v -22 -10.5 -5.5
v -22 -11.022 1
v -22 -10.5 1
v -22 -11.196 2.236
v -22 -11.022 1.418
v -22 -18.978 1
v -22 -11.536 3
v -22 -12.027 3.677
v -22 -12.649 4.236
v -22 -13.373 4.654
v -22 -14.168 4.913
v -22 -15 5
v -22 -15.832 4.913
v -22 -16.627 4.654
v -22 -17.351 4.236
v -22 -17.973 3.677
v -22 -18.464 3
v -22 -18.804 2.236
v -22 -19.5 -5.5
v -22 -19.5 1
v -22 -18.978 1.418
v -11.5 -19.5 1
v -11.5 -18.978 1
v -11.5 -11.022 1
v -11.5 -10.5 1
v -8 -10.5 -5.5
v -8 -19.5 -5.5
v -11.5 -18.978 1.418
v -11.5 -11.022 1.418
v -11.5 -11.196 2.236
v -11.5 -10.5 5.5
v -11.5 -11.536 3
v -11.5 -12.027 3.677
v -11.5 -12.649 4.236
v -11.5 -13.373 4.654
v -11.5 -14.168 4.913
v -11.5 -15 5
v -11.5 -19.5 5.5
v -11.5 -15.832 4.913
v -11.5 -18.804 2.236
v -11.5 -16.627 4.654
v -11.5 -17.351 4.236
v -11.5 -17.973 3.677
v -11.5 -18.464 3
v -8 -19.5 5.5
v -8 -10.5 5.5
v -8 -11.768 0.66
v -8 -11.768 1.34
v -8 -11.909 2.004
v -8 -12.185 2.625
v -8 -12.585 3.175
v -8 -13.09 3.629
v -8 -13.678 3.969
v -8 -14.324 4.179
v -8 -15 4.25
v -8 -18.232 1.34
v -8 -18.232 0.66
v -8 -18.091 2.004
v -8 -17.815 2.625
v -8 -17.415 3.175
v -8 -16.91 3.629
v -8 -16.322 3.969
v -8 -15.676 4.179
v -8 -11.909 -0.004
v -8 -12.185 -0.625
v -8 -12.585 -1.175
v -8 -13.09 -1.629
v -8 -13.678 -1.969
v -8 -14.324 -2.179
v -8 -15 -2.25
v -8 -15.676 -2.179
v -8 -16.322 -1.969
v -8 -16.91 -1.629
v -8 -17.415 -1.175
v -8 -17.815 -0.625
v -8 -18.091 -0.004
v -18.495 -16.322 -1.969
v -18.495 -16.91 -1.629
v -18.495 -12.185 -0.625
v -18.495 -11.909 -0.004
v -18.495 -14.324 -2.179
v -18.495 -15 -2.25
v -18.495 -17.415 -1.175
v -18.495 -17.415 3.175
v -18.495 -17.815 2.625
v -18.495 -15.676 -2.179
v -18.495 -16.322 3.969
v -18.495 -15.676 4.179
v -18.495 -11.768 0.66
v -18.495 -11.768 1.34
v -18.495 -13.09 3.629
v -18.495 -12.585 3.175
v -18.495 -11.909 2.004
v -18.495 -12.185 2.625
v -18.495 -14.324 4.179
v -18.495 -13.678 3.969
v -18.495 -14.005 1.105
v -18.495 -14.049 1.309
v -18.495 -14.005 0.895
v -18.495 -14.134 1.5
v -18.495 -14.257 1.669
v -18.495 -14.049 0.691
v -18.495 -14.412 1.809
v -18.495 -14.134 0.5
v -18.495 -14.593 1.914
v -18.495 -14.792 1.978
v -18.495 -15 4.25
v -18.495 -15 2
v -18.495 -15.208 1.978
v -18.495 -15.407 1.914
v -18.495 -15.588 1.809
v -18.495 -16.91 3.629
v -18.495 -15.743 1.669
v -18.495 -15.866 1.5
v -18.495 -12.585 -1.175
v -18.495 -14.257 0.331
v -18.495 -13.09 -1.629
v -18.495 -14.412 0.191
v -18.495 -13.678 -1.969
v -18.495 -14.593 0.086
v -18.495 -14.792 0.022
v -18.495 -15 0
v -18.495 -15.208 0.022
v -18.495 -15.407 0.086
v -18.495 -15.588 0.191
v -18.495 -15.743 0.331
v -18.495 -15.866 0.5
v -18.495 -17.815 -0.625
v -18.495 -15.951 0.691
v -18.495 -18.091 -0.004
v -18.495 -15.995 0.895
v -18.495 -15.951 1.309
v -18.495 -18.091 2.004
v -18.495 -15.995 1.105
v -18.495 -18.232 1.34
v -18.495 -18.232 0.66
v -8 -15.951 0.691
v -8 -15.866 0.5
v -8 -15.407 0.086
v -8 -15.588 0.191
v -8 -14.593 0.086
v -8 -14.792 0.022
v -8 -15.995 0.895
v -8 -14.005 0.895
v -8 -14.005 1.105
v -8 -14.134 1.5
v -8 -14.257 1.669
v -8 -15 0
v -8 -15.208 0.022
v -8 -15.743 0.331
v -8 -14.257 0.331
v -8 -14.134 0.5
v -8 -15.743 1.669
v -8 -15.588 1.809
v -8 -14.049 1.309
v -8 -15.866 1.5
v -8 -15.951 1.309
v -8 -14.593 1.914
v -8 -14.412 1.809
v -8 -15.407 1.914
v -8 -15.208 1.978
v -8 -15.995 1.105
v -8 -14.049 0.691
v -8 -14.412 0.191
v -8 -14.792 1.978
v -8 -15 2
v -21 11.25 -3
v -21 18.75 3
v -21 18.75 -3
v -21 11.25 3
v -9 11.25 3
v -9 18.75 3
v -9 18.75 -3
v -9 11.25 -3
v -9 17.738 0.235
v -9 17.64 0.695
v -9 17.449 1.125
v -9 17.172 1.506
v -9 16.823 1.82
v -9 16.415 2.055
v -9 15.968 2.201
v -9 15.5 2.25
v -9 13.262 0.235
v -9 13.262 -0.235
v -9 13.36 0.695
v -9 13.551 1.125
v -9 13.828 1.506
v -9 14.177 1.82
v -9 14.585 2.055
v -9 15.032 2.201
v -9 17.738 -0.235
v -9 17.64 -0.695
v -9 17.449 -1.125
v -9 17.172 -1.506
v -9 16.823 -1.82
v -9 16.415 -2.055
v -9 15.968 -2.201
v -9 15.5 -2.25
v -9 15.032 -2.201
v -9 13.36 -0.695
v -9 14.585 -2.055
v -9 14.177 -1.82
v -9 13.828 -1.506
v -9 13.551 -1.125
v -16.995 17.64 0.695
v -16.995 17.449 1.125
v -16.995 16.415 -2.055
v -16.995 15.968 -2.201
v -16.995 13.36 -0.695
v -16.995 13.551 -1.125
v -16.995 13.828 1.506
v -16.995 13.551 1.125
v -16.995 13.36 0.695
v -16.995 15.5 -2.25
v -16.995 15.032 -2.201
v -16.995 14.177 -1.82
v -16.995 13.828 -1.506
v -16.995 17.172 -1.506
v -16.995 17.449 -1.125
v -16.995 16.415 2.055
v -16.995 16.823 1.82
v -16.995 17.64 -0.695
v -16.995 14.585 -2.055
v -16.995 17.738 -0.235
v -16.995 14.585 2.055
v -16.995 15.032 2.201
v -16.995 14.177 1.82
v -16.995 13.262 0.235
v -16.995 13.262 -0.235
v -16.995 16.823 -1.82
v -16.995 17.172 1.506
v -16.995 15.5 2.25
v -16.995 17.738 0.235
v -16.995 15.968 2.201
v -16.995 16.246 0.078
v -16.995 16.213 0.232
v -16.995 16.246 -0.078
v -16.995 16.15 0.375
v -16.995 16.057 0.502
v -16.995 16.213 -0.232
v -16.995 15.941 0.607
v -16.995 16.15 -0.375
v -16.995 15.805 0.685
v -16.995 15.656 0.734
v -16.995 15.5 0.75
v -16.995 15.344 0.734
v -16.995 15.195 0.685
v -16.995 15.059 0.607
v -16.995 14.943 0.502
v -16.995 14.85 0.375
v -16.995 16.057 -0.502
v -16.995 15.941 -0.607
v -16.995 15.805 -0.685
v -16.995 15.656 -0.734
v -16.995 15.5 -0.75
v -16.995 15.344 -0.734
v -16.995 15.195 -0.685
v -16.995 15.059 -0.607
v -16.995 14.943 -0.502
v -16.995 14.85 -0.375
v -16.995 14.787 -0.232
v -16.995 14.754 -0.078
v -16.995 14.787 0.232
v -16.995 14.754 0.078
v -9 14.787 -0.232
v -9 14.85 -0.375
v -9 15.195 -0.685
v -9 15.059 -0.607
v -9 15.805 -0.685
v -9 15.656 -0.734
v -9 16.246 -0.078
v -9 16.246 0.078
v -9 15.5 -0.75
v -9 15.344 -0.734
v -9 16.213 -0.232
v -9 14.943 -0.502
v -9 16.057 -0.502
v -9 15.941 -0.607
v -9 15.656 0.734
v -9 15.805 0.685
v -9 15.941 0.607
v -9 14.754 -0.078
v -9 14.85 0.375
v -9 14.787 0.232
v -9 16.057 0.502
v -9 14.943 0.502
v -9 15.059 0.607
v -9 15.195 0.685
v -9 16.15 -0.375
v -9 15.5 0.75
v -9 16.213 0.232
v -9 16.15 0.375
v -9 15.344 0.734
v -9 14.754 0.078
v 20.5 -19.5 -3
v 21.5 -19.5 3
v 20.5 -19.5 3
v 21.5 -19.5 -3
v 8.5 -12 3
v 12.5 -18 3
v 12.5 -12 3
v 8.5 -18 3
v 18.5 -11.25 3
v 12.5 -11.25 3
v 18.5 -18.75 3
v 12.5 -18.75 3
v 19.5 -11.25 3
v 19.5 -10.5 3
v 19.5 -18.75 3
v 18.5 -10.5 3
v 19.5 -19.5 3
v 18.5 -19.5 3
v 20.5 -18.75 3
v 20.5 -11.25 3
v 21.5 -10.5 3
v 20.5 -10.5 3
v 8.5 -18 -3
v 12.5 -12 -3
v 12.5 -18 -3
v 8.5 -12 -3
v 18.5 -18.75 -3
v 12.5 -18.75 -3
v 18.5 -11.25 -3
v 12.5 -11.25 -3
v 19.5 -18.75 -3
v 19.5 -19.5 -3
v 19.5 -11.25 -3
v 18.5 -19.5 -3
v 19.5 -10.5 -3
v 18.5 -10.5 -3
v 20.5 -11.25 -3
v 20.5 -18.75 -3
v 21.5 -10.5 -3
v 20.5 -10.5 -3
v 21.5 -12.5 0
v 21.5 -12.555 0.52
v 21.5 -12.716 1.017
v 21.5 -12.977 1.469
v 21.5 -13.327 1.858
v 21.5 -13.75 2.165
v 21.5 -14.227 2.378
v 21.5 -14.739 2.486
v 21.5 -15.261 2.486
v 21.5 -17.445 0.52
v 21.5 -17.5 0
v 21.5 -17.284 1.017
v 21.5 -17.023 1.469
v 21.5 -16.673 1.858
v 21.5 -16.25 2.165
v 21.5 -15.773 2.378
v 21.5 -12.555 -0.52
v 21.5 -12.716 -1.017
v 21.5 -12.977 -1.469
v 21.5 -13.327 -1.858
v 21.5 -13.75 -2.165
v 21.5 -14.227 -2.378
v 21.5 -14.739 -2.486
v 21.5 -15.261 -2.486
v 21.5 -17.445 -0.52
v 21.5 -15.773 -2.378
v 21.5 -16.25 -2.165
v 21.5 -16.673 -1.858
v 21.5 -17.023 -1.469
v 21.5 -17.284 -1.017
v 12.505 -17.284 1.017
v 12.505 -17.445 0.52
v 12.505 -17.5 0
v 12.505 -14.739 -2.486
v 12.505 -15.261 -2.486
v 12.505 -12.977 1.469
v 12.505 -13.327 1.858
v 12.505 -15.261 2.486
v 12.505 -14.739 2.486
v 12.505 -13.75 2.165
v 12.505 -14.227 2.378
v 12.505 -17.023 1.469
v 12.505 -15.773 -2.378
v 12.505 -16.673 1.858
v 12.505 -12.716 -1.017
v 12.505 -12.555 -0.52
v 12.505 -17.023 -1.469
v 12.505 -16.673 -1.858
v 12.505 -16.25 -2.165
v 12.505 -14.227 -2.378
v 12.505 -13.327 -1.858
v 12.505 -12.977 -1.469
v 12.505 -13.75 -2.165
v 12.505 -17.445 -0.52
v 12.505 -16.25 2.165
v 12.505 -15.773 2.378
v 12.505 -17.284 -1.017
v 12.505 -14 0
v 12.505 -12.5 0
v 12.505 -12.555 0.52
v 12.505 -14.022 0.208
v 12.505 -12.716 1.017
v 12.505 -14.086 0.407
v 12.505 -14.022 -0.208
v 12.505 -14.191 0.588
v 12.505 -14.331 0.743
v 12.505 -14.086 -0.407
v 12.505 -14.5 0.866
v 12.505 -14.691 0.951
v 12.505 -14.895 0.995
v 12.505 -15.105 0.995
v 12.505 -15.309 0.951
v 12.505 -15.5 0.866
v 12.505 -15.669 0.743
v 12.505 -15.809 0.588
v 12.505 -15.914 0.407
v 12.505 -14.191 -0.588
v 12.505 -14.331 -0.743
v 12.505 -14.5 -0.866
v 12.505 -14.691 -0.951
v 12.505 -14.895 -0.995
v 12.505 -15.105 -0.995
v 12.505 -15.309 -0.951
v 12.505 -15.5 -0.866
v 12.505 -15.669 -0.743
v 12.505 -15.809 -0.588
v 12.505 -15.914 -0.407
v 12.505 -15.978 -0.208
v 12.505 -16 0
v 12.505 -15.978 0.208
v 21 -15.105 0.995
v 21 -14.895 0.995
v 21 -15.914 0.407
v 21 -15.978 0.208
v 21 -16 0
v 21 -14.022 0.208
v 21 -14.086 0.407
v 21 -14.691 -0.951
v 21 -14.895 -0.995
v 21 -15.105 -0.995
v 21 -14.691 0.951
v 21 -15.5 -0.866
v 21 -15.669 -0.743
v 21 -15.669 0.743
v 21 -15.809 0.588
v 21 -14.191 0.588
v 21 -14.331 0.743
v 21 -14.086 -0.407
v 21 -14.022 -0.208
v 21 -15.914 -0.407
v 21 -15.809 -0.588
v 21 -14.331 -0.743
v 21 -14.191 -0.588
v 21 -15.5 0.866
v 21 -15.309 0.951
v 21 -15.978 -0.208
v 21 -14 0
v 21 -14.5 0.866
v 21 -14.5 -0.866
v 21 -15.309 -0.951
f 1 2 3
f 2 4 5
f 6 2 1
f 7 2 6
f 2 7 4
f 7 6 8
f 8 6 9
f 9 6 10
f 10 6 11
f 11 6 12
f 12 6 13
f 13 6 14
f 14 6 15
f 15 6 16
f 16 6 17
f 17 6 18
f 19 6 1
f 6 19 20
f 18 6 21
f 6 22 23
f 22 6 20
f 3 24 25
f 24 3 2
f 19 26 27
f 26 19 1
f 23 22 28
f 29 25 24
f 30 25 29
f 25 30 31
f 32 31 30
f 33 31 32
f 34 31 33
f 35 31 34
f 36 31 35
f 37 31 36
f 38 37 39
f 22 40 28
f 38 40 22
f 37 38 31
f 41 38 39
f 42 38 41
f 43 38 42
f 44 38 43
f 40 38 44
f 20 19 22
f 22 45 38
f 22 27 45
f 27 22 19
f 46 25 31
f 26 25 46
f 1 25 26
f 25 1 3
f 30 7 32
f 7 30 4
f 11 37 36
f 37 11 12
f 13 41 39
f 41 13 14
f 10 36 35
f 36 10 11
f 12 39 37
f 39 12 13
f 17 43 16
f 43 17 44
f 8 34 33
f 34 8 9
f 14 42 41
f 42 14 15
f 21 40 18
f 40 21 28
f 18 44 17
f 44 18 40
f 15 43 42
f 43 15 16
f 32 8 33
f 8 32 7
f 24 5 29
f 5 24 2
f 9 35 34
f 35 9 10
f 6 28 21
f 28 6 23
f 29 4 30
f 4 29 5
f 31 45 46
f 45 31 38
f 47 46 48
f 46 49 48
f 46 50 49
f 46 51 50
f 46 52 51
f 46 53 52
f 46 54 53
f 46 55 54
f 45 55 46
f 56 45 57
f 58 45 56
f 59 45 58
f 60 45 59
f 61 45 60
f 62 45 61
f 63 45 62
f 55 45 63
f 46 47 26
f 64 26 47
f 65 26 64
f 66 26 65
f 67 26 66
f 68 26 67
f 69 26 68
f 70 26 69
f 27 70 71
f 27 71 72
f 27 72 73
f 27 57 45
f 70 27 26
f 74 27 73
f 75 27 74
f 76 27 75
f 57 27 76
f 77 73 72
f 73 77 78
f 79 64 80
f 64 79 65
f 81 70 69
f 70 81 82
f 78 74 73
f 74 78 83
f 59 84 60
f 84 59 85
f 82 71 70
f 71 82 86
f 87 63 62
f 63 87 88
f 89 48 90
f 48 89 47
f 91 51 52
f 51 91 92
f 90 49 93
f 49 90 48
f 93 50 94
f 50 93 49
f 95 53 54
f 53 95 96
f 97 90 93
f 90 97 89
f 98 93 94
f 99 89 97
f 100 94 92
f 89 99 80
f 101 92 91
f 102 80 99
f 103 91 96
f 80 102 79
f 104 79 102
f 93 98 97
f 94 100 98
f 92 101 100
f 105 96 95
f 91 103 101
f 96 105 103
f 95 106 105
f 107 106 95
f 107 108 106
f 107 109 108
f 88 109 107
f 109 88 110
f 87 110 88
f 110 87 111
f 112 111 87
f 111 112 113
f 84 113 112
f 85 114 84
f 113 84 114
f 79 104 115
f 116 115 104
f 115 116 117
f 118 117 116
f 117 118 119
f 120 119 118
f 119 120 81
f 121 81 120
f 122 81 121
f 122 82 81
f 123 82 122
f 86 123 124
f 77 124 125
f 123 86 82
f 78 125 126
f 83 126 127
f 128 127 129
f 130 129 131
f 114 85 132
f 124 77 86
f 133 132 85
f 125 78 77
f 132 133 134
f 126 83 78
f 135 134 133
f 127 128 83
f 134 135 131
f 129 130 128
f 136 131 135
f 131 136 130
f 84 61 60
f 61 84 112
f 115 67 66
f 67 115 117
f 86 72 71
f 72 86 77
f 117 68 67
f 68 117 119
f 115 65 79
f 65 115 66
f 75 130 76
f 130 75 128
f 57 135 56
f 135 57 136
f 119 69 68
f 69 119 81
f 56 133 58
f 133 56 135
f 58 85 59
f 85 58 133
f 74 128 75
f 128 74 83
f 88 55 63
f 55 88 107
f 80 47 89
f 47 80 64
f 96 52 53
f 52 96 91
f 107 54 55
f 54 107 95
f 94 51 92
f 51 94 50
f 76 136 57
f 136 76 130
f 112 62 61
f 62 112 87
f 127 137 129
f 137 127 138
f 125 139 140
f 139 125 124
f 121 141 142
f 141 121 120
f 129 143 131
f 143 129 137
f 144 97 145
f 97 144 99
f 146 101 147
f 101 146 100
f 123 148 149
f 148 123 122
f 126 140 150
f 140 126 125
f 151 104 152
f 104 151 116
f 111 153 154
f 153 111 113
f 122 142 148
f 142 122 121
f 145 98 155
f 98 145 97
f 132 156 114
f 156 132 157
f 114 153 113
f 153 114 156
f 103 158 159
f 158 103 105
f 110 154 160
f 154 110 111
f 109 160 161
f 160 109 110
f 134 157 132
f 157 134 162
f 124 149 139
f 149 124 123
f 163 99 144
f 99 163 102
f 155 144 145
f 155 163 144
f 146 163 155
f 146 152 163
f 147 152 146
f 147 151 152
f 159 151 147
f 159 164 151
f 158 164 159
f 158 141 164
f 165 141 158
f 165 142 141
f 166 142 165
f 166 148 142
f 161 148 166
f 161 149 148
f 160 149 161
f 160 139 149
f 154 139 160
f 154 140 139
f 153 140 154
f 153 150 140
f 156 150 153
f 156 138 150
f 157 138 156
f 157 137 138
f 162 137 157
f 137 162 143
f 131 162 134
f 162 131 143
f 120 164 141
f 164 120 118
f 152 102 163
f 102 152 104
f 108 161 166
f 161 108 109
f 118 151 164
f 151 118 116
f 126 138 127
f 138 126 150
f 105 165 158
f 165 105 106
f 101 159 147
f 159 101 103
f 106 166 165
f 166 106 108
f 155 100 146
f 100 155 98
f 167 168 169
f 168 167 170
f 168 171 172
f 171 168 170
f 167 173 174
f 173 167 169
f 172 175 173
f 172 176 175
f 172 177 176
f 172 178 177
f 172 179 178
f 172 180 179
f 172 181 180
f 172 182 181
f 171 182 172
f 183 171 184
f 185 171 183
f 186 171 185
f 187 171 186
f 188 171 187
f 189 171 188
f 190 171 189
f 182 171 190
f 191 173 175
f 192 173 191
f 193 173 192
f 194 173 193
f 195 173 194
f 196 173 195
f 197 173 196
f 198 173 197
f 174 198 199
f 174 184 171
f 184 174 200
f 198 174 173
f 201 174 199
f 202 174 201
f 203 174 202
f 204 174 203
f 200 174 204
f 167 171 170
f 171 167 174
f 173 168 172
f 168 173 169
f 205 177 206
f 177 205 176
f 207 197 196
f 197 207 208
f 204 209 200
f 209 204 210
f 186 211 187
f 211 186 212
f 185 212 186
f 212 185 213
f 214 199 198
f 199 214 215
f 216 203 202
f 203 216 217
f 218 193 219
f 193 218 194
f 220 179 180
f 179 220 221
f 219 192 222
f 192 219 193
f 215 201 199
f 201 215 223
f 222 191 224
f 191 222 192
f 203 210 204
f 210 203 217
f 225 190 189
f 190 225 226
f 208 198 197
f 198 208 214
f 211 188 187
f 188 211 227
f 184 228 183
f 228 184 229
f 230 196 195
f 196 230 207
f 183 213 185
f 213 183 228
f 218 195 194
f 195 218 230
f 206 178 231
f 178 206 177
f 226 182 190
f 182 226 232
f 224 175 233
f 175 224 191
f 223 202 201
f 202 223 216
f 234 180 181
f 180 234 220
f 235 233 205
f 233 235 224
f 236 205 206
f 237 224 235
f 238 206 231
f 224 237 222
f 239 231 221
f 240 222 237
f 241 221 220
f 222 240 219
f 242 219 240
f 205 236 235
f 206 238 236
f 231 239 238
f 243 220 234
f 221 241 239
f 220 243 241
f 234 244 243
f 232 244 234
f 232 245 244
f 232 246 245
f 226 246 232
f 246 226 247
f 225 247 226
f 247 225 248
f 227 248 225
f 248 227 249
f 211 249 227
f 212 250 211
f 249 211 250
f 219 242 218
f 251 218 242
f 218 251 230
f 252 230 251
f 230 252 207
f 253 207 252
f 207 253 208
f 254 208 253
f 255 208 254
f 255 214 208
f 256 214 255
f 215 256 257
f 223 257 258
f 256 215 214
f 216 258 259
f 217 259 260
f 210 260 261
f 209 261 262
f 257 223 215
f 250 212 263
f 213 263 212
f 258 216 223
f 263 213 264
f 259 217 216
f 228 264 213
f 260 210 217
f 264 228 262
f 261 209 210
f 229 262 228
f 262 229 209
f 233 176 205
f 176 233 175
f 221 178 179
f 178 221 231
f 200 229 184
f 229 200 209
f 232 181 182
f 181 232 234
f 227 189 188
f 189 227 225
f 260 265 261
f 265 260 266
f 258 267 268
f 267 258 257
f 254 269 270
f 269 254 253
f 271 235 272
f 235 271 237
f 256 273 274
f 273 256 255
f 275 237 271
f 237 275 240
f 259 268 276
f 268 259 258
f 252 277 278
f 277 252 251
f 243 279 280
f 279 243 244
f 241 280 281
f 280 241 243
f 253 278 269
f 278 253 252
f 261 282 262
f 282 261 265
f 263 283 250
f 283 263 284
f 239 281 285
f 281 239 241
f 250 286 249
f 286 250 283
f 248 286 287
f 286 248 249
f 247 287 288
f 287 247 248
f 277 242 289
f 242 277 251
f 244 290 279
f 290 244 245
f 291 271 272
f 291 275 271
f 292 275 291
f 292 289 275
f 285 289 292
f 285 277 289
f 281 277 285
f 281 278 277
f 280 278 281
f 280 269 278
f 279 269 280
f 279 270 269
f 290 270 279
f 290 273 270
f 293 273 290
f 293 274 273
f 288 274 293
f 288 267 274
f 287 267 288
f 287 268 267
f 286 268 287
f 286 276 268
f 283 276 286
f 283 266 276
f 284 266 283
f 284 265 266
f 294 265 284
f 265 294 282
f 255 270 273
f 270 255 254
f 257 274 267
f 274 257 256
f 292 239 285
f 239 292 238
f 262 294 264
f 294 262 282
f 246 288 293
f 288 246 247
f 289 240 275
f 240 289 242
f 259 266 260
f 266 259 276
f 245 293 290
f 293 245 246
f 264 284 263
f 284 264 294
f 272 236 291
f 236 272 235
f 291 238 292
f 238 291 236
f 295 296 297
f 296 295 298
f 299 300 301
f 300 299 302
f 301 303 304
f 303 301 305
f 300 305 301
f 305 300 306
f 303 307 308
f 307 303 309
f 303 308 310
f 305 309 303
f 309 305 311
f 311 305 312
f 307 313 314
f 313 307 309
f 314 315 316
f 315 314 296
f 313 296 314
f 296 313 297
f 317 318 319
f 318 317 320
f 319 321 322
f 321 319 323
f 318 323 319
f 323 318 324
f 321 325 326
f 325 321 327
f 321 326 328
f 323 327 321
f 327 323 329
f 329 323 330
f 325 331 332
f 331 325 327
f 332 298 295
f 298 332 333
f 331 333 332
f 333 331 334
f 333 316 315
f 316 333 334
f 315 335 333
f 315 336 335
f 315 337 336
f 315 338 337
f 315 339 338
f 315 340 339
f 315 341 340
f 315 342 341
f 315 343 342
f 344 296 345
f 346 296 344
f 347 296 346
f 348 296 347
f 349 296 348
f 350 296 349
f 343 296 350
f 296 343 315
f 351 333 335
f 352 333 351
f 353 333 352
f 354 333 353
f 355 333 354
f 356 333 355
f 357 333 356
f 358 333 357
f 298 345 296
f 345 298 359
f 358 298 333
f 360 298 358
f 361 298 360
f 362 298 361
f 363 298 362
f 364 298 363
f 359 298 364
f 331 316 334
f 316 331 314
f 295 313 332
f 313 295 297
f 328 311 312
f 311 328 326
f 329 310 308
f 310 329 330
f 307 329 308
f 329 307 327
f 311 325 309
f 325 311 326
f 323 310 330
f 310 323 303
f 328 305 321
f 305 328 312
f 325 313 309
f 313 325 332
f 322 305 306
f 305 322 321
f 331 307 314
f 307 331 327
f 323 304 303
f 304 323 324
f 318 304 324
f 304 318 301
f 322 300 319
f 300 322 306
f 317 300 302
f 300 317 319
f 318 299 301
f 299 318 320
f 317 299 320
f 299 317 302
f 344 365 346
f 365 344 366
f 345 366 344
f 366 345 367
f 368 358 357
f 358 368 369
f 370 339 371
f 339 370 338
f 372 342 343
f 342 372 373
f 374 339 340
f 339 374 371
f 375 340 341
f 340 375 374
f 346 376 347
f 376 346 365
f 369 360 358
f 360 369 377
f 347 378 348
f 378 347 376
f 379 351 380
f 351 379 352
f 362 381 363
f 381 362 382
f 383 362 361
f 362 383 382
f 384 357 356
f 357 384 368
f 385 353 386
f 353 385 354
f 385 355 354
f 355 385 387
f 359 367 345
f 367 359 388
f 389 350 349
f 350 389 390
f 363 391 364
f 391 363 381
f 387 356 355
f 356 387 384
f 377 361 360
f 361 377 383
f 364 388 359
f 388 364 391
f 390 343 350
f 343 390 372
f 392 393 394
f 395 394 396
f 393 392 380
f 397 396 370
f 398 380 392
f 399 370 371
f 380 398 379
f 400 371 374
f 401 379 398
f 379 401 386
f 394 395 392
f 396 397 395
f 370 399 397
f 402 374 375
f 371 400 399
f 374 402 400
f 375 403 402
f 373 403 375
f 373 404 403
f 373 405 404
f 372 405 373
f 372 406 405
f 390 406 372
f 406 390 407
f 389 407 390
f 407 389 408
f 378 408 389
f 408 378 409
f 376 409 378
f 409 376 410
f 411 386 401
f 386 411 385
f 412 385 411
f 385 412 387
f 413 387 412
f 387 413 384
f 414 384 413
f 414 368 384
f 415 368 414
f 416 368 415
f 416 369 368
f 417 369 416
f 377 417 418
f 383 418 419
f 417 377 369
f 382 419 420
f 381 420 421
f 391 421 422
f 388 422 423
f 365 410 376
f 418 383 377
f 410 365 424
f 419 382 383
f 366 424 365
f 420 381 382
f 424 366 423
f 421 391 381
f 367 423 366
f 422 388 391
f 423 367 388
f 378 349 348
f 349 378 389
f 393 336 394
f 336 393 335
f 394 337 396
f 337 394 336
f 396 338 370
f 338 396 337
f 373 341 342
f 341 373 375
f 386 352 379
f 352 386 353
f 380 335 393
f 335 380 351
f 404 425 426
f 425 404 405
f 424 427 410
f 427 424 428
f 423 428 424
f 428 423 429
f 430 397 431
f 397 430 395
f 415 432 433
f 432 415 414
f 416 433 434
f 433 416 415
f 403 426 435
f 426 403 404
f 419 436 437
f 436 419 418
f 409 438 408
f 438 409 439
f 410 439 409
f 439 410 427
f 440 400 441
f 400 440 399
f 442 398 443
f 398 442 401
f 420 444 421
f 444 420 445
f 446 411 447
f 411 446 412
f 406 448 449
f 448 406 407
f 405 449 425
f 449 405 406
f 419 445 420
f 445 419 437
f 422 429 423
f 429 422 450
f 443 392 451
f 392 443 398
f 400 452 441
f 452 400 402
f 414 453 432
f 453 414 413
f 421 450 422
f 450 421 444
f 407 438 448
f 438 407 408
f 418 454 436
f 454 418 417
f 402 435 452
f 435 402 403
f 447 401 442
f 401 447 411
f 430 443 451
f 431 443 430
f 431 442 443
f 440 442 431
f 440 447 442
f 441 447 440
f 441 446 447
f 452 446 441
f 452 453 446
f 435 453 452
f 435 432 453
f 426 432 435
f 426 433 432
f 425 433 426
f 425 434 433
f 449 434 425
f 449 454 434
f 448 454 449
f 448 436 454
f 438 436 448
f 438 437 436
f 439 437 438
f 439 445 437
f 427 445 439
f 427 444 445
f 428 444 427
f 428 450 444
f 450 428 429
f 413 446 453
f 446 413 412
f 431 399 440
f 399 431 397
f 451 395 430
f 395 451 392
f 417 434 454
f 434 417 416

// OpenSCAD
// file: ../globals.scad
// Copyright (c) 2017 Clément Bœsch <u pkh.me>
//
// Permission to use, copy, modify, and distribute this software for any
// purpose with or without fee is hereby granted, provided that the above
// copyright notice and this permission notice appear in all copies.
//
// THE SOFTWARE IS PROVIDED "AS IS" AND THE AUTHOR DISCLAIMS ALL WARRANTIES
// WITH REGARD TO THIS SOFTWARE INCLUDING ALL IMPLIED WARRANTIES OF
// MERCHANTABILITY AND FITNESS. IN NO EVENT SHALL THE AUTHOR BE LIABLE FOR
// ANY SPECIAL, DIRECT, INDIRECT, OR CONSEQUENTIAL DAMAGES OR ANY DAMAGES
// WHATSOEVER RESULTING FROM LOSS OF USE, DATA OR PROFITS, WHETHER IN AN
// ACTION OF CONTRACT, NEGLIGENCE OR OTHER TORTIOUS ACTION, ARISING OUT OF
// OR IN CONNECTION WITH THE USE OR PERFORMANCE OF THIS SOFTWARE.

$fn = 30;

_delta = 0.005;

c_black        = [.17,.17,.17];
c_black_redish = [.35,.30,.30];
c_gold         = [.75,.55,.00];
c_gray         = [.40,.40,.40];
c_darkgray     = [.25,.25,.25];
c_green_pcb    = [.00,.50,.25];
c_metal        = [.70,.70,.70];
c_yellow       = [.70,.70,.30];
c_darkblue     = [.20,.30,.40];
// file: _internal.scad
// Copyright (c) 2017 Clément Bœsch <u pkh.me>
//
// Permission to use, copy, modify, and distribute this software for any
// purpose with or without fee is hereby granted, provided that the above
// copyright notice and this permission notice appear in all copies.
//
// THE SOFTWARE IS PROVIDED "AS IS" AND THE AUTHOR DISCLAIMS ALL WARRANTIES
// WITH REGARD TO THIS SOFTWARE INCLUDING ALL IMPLIED WARRANTIES OF
// MERCHANTABILITY AND FITNESS. IN NO EVENT SHALL THE AUTHOR BE LIABLE FOR
// ANY SPECIAL, DIRECT, INDIRECT, OR CONSEQUENTIAL DAMAGES OR ANY DAMAGES
// WHATSOEVER RESULTING FROM LOSS OF USE, DATA OR PROFITS, WHETHER IN AN
// ACTION OF CONTRACT, NEGLIGENCE OR OTHER TORTIOUS ACTION, ARISING OUT OF
// OR IN CONNECTION WITH THE USE OR PERFORMANCE OF THIS SOFTWARE.

include <../globals.scad>

$vpr = [50, 0, 90];

module components_demo(pad=30) {
    n = $children;
    cols = ceil(sqrt(n));
    rows = ceil(n / cols);
    offx = pad * (rows - 1) / 2;
    offy = pad * (cols - 1) / 2;
    for (i = [0:n-1]) {
        x = floor(i / cols);
        y = i % cols;
        translate([x*pad - offx, y*pad - offy])
            rotate(360 * $t)
                children(i);
    }
}
// main file
// Copyright (c) 2017 Clément Bœsch <u pkh.me>
//
// Permission to use, copy, modify, and distribute this software for any
// purpose with or without fee is hereby granted, provided that the above
// copyright notice and this permission notice appear in all copies.
//
// THE SOFTWARE IS PROVIDED "AS IS" AND THE AUTHOR DISCLAIMS ALL WARRANTIES
// WITH REGARD TO THIS SOFTWARE INCLUDING ALL IMPLIED WARRANTIES OF
// MERCHANTABILITY AND FITNESS. IN NO EVENT SHALL THE AUTHOR BE LIABLE FOR
// ANY SPECIAL, DIRECT, INDIRECT, OR CONSEQUENTIAL DAMAGES OR ANY DAMAGES
// WHATSOEVER RESULTING FROM LOSS OF USE, DATA OR PROFITS, WHETHER IN AN
// ACTION OF CONTRACT, NEGLIGENCE OR OTHER TORTIOUS ACTION, ARISING OUT OF
// OR IN CONNECTION WITH THE USE OR PERFORMANCE OF THIS SOFTWARE.

include <_internal.scad>

$vpd = 150;

module power_bbb(dim=[14, 9, 11]) {
    l = dim[0];
    w = dim[1];
    h = dim[2];

    l1 = 3.5;
    l0 = l - l1;
    h0 = 6.5;

    rotate([0, 0, 180]) translate(dim * -.5) { // XXX
        color(c_black) {
            difference() {
                union() {
                    translate([l1, 0]) {
                        cube([l0, w, h0]);
                        translate([0, w/2, h0])
                            rotate([0, 90])
                                cylinder(d=w-1, h=l0);
                    }
                    cube([l1, w, h]);
                }
                translate([-_delta, w/2, h0])
                    rotate([0, 90])
                        cylinder(d=6.5, h=l0);
            }
        }
        color(c_metal)
            translate([0, w/2, h0])
                rotate([0, 90])
                    cylinder(d=2, h=l0);
    }
}

module power_cubie(dim=[12, 7.5, 6]) {
    l = dim[0];
    w = dim[1];
    h = dim[2];
    depth = 8; // actual depth
    power_hole_d = 4.5;
    rotate([0, 0, 180]) translate(dim * -.5) { // XXX
    color(c_black) {
        difference() {
            cube(dim);
            translate([-_delta, 1+power_hole_d/2, h/2]) // yes it's misaligned
                rotate([0, 90, 0])
                    cylinder(d=power_hole_d, h=depth);
        }
    }
    color(c_metal)
        translate([0, 1+power_hole_d/2, h/2])
            rotate([0, 90, 0])
                cylinder(d=1.5, h=depth);
    }
}

module power_hikey(dim=[13, 9, 6]) {
    l = dim[1];
    w = dim[0];
    h = dim[2];

    rotate([0, 0, 180]) { // XXX
    translate([w/2, -l/2, -h/2]) // XXX
    rotate([0, 0, 90]) { // XXX
    color(c_black) {
        difference() {
            union() {
                translate([0, w-1])     cube([l, 1, h]);
                translate([0, w-3])     cube([l, 1, h]);
                translate([1.5/2, w-9]) cube([l-1.5, 8, h]);
                translate([3/2, 0])     cube([l-3, w-9, h]);
            }
            translate([l/2, w+_delta, h/2])
                rotate([90, 0, 0])
                    cylinder(d=5, h=9);
        }
    }
    color(c_metal)
        translate([l/2, w-.5, h/2])
            rotate([90, 0, 0])
                cylinder(d=2, h=9);
    }
    }
}

function power_bbb_info() = [
    ["category", "power"],
    ["watch", "horizon"],
];

function power_cubie_info() = [
    ["category", "power"],
    ["watch", "horizon"],
];

function power_hikey_info() = [
    ["category", "power"],
    ["watch", "horizon"],
];

components_demo() {
    power_bbb();
    power_cubie();
    power_hikey();
}
